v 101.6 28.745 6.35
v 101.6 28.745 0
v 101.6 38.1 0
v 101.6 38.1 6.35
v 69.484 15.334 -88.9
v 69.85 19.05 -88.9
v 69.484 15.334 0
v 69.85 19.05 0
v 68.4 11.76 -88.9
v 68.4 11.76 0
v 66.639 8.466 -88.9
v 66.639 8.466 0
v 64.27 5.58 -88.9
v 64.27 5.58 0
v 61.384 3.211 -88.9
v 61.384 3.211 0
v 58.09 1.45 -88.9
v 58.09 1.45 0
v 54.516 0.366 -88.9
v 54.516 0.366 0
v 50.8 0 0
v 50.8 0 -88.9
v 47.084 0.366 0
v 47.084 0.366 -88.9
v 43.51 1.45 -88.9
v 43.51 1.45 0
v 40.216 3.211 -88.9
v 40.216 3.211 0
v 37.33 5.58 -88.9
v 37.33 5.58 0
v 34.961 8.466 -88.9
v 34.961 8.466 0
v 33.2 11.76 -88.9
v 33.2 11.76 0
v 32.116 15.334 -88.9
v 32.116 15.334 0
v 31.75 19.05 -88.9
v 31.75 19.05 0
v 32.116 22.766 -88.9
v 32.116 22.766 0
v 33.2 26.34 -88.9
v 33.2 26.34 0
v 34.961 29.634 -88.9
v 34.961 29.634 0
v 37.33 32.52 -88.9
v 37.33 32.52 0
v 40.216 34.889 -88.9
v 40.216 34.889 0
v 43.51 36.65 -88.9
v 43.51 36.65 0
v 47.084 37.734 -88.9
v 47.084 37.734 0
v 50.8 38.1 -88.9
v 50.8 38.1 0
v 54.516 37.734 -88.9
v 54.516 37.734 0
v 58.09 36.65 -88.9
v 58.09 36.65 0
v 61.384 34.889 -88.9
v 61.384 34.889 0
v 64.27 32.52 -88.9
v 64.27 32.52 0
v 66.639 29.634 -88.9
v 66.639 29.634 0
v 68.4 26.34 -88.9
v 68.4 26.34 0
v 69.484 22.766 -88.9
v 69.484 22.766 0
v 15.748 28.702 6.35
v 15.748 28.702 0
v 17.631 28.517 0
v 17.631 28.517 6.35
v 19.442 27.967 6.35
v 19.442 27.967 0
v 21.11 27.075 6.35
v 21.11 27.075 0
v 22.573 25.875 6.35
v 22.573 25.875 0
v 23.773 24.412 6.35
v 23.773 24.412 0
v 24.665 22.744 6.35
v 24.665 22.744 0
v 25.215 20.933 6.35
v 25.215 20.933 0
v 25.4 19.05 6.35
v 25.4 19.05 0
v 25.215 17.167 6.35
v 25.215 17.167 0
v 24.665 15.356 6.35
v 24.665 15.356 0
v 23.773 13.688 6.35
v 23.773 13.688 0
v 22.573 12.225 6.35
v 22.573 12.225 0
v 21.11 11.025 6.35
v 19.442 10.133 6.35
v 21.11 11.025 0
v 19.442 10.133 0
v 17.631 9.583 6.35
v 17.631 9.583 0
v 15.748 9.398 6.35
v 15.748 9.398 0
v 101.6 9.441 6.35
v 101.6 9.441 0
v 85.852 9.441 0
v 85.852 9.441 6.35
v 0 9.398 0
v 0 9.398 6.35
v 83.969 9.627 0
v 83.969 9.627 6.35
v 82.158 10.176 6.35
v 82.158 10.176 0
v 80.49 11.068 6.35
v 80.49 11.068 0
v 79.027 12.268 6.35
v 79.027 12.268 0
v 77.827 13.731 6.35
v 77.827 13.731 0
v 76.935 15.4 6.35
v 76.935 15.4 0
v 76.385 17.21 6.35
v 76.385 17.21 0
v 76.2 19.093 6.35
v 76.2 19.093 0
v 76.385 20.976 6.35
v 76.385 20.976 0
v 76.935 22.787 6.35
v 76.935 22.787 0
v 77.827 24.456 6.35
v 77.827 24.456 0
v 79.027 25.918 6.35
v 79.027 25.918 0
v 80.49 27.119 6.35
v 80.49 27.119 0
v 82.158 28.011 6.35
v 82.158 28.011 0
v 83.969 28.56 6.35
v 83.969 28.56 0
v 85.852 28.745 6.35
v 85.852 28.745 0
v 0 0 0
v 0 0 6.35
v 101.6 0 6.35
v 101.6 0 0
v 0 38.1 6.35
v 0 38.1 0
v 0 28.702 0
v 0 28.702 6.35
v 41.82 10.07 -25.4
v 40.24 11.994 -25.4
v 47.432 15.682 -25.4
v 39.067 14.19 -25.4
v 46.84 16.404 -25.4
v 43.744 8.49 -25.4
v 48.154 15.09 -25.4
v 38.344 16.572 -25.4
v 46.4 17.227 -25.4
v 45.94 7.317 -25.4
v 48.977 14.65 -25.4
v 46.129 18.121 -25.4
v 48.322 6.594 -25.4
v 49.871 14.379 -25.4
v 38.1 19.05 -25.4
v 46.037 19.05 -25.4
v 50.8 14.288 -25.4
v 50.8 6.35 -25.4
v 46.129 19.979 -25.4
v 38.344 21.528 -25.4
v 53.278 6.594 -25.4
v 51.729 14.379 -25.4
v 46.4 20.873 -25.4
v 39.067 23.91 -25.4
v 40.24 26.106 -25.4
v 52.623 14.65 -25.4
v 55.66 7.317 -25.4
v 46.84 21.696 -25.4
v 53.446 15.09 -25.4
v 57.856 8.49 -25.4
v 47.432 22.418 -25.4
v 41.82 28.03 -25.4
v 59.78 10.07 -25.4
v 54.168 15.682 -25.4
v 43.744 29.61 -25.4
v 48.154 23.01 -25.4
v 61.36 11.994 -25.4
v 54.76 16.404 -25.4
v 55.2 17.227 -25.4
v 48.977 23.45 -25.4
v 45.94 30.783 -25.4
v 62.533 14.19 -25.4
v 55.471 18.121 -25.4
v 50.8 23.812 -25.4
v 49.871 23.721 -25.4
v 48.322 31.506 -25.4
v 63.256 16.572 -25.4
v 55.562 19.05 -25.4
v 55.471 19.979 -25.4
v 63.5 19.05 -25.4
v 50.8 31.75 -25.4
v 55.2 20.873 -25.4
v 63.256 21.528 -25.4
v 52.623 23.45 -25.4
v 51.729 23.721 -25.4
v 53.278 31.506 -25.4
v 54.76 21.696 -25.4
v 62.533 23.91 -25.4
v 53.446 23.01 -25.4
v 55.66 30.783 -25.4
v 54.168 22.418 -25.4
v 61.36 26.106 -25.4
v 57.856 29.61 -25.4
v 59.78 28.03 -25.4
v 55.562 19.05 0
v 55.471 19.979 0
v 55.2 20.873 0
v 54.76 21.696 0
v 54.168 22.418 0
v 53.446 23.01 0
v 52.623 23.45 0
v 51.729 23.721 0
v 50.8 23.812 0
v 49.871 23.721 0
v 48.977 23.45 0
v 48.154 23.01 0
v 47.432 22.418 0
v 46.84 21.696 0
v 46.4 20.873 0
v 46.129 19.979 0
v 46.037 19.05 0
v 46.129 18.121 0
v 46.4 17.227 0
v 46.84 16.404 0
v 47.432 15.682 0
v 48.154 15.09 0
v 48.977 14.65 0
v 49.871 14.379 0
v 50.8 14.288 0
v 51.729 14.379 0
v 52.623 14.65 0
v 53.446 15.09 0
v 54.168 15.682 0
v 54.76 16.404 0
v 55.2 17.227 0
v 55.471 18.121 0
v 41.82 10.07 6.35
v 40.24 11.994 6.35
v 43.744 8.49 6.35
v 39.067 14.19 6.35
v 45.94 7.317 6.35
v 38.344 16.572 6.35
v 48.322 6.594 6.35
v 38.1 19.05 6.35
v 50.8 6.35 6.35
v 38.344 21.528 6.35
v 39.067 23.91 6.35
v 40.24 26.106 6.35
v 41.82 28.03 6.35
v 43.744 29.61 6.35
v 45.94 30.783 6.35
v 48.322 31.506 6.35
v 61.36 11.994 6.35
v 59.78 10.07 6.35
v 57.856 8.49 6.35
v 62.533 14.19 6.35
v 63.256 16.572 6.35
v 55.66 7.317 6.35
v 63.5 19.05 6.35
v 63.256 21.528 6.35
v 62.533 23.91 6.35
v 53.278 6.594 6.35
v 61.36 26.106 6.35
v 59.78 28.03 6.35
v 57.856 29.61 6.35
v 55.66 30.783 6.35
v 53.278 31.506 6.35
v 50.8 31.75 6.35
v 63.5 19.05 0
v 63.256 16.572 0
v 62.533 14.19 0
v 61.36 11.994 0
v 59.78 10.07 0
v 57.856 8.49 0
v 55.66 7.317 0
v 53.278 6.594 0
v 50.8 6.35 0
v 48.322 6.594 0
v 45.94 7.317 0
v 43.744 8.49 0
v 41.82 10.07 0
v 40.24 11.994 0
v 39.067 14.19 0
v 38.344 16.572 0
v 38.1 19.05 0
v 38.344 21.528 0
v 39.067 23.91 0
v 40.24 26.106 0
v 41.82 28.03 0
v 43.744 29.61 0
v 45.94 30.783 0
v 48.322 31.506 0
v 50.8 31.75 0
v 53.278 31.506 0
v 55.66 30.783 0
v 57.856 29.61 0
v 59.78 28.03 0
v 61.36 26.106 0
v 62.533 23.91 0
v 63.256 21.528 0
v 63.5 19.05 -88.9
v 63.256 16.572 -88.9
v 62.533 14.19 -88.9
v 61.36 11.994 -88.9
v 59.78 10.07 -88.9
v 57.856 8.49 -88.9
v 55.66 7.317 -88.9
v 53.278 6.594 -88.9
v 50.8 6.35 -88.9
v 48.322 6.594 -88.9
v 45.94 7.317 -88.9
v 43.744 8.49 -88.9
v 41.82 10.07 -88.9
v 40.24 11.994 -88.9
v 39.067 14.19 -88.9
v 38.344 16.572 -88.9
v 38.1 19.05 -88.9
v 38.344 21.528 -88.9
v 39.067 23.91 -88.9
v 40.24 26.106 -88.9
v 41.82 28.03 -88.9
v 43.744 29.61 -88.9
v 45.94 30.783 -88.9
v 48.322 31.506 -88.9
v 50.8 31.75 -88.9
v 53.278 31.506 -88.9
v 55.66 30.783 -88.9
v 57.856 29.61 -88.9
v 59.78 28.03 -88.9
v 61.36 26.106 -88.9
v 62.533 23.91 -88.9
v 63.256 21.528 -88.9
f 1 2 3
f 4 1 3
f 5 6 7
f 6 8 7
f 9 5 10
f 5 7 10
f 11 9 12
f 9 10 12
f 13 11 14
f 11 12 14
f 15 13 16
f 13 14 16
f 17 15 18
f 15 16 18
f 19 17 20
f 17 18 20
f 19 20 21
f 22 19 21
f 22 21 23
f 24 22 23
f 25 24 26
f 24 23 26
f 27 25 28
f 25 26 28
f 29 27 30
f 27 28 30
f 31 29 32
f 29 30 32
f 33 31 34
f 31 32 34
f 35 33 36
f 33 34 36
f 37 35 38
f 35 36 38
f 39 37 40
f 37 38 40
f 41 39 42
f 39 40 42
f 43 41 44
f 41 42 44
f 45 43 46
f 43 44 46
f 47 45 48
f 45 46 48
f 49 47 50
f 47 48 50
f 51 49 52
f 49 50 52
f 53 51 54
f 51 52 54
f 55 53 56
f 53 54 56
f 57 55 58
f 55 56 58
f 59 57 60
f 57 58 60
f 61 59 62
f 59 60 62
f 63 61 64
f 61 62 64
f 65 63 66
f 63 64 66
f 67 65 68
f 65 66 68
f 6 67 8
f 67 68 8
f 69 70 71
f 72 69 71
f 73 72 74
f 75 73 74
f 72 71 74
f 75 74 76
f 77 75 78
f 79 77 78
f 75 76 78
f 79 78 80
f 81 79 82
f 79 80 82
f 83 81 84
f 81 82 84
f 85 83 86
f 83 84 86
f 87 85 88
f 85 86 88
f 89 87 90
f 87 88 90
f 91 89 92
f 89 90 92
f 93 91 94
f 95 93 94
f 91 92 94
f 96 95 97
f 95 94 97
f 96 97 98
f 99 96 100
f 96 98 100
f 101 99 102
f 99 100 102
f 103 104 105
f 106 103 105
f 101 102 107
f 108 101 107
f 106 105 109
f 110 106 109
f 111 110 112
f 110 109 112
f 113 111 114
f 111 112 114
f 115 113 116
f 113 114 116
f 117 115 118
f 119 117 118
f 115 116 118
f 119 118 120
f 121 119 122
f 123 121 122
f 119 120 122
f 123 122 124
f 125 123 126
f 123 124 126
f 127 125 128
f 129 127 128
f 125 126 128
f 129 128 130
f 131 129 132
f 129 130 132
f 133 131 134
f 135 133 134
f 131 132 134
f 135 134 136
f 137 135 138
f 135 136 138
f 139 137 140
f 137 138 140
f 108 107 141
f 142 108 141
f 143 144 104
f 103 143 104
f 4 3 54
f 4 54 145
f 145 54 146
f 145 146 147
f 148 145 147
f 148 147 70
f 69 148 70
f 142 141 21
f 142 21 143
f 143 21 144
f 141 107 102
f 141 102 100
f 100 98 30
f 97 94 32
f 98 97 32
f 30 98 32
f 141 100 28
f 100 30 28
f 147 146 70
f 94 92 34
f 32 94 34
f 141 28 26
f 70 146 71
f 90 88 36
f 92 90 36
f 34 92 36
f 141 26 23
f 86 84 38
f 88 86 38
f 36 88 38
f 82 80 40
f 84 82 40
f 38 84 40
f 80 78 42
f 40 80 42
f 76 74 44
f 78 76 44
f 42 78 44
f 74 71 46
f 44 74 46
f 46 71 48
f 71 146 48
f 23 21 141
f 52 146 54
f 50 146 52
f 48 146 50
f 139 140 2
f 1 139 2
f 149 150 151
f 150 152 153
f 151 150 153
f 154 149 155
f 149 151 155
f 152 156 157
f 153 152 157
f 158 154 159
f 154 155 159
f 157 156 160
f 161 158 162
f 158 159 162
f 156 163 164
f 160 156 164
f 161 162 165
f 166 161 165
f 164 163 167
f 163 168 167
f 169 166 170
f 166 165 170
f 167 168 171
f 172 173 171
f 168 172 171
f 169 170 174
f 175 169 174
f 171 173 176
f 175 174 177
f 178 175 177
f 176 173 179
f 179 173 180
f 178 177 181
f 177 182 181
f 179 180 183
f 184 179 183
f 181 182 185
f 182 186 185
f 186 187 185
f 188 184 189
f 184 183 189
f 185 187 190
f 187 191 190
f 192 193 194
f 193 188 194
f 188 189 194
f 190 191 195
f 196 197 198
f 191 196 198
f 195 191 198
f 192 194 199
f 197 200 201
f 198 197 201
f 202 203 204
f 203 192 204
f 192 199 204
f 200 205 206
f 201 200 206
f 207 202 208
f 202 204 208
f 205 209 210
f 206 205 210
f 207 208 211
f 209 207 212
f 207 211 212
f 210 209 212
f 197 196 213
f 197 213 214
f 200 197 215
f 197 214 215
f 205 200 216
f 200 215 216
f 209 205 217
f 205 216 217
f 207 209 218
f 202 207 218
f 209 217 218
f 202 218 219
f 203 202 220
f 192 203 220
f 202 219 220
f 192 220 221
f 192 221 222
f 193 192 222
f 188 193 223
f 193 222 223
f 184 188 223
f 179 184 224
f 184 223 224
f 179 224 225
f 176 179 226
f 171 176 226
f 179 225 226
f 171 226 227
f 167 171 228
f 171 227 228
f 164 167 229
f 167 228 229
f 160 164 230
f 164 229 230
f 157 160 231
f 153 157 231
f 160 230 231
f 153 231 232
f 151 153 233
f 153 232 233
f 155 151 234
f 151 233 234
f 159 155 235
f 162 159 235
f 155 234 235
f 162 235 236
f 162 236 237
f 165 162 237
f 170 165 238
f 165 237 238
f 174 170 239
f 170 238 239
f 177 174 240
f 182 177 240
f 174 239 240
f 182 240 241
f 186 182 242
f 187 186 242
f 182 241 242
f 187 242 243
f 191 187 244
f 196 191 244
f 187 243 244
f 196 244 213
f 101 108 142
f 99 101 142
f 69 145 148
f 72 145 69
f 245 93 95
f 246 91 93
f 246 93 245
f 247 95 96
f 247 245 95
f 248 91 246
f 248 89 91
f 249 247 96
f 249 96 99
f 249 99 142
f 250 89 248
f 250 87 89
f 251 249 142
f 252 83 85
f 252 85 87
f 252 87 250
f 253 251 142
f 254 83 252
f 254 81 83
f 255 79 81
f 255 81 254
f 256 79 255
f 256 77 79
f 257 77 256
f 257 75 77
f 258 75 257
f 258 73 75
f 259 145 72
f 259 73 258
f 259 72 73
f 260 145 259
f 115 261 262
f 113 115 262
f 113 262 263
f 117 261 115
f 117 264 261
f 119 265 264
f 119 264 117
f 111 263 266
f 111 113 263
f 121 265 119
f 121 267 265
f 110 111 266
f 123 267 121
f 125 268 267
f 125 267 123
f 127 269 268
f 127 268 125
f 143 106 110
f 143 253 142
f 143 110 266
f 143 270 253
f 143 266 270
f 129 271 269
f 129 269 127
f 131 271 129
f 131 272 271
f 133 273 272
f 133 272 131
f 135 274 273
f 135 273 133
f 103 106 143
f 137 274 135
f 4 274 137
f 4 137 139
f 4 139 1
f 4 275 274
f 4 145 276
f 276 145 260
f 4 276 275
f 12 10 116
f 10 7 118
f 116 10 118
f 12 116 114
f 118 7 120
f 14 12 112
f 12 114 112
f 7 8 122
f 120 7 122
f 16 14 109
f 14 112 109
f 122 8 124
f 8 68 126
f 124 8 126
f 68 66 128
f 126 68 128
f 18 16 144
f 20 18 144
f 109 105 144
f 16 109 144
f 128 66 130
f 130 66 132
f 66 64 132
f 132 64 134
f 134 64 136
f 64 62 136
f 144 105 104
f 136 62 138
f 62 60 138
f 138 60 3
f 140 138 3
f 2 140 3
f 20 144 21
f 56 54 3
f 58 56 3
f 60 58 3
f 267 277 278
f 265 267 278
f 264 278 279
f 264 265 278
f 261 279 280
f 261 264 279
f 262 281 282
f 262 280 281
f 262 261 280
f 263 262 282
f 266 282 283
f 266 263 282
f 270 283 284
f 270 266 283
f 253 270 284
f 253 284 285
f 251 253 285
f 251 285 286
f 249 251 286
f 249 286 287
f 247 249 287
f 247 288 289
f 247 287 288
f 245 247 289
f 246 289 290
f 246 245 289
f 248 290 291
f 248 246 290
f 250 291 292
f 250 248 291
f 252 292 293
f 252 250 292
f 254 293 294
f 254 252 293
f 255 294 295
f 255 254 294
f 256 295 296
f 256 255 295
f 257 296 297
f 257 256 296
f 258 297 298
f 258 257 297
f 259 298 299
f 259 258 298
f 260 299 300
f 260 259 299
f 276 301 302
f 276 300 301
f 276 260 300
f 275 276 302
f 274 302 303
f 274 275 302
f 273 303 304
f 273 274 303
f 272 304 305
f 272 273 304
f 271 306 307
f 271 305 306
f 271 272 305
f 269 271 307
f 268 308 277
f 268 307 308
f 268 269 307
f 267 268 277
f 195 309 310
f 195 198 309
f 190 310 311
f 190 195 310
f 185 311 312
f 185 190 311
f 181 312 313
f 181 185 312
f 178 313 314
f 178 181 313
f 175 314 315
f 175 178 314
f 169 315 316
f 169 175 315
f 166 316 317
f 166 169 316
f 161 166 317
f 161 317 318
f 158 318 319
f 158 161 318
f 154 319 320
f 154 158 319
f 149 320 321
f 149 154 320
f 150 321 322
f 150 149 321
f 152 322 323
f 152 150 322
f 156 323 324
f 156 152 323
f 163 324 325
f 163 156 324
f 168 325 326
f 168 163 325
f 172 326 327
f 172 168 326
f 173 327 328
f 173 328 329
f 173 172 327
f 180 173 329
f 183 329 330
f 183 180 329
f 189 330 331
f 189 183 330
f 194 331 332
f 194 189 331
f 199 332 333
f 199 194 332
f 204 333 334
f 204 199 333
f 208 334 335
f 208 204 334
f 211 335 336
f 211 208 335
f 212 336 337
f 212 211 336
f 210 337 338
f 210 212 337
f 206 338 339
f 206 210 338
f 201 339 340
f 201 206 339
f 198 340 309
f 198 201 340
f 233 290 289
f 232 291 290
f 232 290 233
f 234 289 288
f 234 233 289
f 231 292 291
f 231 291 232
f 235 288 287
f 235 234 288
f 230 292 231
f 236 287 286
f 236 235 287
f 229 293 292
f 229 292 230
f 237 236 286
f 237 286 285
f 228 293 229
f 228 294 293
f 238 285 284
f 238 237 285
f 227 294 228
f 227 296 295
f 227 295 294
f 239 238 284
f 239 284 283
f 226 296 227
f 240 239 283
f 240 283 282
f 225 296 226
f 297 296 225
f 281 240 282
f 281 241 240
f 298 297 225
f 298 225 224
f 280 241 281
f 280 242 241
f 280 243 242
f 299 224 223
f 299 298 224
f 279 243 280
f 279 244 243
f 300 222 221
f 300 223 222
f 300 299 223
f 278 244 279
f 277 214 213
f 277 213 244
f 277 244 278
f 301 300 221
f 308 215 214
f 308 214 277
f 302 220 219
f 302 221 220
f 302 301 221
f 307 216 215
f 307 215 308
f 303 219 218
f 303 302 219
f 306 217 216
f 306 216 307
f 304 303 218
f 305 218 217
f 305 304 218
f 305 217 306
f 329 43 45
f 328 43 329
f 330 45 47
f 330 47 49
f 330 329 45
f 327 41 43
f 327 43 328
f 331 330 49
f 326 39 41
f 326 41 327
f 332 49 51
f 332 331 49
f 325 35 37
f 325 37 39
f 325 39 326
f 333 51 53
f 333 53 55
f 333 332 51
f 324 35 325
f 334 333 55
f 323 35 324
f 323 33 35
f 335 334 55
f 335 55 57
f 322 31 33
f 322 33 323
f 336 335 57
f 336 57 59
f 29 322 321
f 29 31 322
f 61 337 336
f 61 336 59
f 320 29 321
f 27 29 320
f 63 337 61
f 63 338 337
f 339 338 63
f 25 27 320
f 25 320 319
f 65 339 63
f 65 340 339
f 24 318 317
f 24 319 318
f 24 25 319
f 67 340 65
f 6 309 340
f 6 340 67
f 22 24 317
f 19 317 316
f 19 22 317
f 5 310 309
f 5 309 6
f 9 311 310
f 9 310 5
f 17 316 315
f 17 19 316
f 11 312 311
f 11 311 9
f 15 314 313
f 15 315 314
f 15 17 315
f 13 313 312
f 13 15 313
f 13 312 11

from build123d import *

# Parameters (mm, degrees)
F0_R        = 12.7
F1_DEPTH    = 6.35
F2_R        = 12.7
F3_DEPTH    = 63.5
F3_FACE_R   = 19.05
F3_FACE_R_2 = 12.7
F4_R        = 19.05
F4_R_2      = 4.7625
F5_DEPTH    = 25.4


with BuildPart() as f1:
    # F0 (on Top) → F1 (new body)
    with BuildSketch(Plane.XY):
        with BuildLine():
            Line((0, 9.398), (0, 0))
            Line((0, 0), (101.6, 0))
            Line((101.6, 0), (101.6, 9.4413837329))
            Line((101.6, 9.4413837329), (85.851973152, 9.4413837329))
            ThreePointArc((85.851973152, 9.4413837329), (76.199973152, 19.0933837329), (85.851973152, 28.7453837329))
            Line((85.851973152, 28.7453837329), (101.6, 28.7453837329))
            Line((101.6, 28.7453837329), (101.6, 38.1))
            Line((101.6, 38.1), (50.7999907375, 38.1))
            Line((50.7999907375, 38.1), (-1.85251e-05, 38.1))
            Line((-1.85251e-05, 38.1), (-1.85251e-05, 28.702))
            Line((-1.85251e-05, 28.702), (15.748, 28.702))
            ThreePointArc((15.748, 28.702), (25.4, 19.05), (15.748, 9.398))
            Line((15.748, 9.398), (0, 9.398))
        make_face()
        with Locations((50.8, 19.05)):
            Circle(F0_R, mode=Mode.SUBTRACT)
    extrude(amount=F1_DEPTH)

    # F2 (on face) → F3 (join)
    with BuildSketch(Plane(origin=(0, 0, 0), x_dir=(1, 0, 0), z_dir=(0, 0, -1))):
        with BuildLine():
            ThreePointArc((50.8, -38.1), (64.2703841816, -32.5203841816), (69.85, -19.05))
            ThreePointArc((69.85, -19.05), (64.2703841816, -5.5796158184), (50.8, 0))
            ThreePointArc((50.8, 0), (31.75, -19.05), (50.8, -38.1))
        make_face()
        with Locations((50.8, -19.05)):
            Circle(F2_R, mode=Mode.SUBTRACT)
    extrude(amount=F3_DEPTH)

    # F3_face (on face) + F4 (on Top) → F5 (join)
    with BuildSketch(Plane(origin=(50.8, 19.05, -63.5), x_dir=(1, 0, 0), z_dir=(0, 0, -1))):
        Circle(F3_FACE_R)
        Circle(F3_FACE_R_2, mode=Mode.SUBTRACT)
    with BuildSketch(Plane.XY):
        with Locations((50.8, 19.05)):
            Circle(F4_R)
        with Locations((50.8, 19.05)):
            Circle(F4_R_2, mode=Mode.SUBTRACT)
    extrude(amount=F5_DEPTH, dir=(0, 0, -1))


solid = f1.part
